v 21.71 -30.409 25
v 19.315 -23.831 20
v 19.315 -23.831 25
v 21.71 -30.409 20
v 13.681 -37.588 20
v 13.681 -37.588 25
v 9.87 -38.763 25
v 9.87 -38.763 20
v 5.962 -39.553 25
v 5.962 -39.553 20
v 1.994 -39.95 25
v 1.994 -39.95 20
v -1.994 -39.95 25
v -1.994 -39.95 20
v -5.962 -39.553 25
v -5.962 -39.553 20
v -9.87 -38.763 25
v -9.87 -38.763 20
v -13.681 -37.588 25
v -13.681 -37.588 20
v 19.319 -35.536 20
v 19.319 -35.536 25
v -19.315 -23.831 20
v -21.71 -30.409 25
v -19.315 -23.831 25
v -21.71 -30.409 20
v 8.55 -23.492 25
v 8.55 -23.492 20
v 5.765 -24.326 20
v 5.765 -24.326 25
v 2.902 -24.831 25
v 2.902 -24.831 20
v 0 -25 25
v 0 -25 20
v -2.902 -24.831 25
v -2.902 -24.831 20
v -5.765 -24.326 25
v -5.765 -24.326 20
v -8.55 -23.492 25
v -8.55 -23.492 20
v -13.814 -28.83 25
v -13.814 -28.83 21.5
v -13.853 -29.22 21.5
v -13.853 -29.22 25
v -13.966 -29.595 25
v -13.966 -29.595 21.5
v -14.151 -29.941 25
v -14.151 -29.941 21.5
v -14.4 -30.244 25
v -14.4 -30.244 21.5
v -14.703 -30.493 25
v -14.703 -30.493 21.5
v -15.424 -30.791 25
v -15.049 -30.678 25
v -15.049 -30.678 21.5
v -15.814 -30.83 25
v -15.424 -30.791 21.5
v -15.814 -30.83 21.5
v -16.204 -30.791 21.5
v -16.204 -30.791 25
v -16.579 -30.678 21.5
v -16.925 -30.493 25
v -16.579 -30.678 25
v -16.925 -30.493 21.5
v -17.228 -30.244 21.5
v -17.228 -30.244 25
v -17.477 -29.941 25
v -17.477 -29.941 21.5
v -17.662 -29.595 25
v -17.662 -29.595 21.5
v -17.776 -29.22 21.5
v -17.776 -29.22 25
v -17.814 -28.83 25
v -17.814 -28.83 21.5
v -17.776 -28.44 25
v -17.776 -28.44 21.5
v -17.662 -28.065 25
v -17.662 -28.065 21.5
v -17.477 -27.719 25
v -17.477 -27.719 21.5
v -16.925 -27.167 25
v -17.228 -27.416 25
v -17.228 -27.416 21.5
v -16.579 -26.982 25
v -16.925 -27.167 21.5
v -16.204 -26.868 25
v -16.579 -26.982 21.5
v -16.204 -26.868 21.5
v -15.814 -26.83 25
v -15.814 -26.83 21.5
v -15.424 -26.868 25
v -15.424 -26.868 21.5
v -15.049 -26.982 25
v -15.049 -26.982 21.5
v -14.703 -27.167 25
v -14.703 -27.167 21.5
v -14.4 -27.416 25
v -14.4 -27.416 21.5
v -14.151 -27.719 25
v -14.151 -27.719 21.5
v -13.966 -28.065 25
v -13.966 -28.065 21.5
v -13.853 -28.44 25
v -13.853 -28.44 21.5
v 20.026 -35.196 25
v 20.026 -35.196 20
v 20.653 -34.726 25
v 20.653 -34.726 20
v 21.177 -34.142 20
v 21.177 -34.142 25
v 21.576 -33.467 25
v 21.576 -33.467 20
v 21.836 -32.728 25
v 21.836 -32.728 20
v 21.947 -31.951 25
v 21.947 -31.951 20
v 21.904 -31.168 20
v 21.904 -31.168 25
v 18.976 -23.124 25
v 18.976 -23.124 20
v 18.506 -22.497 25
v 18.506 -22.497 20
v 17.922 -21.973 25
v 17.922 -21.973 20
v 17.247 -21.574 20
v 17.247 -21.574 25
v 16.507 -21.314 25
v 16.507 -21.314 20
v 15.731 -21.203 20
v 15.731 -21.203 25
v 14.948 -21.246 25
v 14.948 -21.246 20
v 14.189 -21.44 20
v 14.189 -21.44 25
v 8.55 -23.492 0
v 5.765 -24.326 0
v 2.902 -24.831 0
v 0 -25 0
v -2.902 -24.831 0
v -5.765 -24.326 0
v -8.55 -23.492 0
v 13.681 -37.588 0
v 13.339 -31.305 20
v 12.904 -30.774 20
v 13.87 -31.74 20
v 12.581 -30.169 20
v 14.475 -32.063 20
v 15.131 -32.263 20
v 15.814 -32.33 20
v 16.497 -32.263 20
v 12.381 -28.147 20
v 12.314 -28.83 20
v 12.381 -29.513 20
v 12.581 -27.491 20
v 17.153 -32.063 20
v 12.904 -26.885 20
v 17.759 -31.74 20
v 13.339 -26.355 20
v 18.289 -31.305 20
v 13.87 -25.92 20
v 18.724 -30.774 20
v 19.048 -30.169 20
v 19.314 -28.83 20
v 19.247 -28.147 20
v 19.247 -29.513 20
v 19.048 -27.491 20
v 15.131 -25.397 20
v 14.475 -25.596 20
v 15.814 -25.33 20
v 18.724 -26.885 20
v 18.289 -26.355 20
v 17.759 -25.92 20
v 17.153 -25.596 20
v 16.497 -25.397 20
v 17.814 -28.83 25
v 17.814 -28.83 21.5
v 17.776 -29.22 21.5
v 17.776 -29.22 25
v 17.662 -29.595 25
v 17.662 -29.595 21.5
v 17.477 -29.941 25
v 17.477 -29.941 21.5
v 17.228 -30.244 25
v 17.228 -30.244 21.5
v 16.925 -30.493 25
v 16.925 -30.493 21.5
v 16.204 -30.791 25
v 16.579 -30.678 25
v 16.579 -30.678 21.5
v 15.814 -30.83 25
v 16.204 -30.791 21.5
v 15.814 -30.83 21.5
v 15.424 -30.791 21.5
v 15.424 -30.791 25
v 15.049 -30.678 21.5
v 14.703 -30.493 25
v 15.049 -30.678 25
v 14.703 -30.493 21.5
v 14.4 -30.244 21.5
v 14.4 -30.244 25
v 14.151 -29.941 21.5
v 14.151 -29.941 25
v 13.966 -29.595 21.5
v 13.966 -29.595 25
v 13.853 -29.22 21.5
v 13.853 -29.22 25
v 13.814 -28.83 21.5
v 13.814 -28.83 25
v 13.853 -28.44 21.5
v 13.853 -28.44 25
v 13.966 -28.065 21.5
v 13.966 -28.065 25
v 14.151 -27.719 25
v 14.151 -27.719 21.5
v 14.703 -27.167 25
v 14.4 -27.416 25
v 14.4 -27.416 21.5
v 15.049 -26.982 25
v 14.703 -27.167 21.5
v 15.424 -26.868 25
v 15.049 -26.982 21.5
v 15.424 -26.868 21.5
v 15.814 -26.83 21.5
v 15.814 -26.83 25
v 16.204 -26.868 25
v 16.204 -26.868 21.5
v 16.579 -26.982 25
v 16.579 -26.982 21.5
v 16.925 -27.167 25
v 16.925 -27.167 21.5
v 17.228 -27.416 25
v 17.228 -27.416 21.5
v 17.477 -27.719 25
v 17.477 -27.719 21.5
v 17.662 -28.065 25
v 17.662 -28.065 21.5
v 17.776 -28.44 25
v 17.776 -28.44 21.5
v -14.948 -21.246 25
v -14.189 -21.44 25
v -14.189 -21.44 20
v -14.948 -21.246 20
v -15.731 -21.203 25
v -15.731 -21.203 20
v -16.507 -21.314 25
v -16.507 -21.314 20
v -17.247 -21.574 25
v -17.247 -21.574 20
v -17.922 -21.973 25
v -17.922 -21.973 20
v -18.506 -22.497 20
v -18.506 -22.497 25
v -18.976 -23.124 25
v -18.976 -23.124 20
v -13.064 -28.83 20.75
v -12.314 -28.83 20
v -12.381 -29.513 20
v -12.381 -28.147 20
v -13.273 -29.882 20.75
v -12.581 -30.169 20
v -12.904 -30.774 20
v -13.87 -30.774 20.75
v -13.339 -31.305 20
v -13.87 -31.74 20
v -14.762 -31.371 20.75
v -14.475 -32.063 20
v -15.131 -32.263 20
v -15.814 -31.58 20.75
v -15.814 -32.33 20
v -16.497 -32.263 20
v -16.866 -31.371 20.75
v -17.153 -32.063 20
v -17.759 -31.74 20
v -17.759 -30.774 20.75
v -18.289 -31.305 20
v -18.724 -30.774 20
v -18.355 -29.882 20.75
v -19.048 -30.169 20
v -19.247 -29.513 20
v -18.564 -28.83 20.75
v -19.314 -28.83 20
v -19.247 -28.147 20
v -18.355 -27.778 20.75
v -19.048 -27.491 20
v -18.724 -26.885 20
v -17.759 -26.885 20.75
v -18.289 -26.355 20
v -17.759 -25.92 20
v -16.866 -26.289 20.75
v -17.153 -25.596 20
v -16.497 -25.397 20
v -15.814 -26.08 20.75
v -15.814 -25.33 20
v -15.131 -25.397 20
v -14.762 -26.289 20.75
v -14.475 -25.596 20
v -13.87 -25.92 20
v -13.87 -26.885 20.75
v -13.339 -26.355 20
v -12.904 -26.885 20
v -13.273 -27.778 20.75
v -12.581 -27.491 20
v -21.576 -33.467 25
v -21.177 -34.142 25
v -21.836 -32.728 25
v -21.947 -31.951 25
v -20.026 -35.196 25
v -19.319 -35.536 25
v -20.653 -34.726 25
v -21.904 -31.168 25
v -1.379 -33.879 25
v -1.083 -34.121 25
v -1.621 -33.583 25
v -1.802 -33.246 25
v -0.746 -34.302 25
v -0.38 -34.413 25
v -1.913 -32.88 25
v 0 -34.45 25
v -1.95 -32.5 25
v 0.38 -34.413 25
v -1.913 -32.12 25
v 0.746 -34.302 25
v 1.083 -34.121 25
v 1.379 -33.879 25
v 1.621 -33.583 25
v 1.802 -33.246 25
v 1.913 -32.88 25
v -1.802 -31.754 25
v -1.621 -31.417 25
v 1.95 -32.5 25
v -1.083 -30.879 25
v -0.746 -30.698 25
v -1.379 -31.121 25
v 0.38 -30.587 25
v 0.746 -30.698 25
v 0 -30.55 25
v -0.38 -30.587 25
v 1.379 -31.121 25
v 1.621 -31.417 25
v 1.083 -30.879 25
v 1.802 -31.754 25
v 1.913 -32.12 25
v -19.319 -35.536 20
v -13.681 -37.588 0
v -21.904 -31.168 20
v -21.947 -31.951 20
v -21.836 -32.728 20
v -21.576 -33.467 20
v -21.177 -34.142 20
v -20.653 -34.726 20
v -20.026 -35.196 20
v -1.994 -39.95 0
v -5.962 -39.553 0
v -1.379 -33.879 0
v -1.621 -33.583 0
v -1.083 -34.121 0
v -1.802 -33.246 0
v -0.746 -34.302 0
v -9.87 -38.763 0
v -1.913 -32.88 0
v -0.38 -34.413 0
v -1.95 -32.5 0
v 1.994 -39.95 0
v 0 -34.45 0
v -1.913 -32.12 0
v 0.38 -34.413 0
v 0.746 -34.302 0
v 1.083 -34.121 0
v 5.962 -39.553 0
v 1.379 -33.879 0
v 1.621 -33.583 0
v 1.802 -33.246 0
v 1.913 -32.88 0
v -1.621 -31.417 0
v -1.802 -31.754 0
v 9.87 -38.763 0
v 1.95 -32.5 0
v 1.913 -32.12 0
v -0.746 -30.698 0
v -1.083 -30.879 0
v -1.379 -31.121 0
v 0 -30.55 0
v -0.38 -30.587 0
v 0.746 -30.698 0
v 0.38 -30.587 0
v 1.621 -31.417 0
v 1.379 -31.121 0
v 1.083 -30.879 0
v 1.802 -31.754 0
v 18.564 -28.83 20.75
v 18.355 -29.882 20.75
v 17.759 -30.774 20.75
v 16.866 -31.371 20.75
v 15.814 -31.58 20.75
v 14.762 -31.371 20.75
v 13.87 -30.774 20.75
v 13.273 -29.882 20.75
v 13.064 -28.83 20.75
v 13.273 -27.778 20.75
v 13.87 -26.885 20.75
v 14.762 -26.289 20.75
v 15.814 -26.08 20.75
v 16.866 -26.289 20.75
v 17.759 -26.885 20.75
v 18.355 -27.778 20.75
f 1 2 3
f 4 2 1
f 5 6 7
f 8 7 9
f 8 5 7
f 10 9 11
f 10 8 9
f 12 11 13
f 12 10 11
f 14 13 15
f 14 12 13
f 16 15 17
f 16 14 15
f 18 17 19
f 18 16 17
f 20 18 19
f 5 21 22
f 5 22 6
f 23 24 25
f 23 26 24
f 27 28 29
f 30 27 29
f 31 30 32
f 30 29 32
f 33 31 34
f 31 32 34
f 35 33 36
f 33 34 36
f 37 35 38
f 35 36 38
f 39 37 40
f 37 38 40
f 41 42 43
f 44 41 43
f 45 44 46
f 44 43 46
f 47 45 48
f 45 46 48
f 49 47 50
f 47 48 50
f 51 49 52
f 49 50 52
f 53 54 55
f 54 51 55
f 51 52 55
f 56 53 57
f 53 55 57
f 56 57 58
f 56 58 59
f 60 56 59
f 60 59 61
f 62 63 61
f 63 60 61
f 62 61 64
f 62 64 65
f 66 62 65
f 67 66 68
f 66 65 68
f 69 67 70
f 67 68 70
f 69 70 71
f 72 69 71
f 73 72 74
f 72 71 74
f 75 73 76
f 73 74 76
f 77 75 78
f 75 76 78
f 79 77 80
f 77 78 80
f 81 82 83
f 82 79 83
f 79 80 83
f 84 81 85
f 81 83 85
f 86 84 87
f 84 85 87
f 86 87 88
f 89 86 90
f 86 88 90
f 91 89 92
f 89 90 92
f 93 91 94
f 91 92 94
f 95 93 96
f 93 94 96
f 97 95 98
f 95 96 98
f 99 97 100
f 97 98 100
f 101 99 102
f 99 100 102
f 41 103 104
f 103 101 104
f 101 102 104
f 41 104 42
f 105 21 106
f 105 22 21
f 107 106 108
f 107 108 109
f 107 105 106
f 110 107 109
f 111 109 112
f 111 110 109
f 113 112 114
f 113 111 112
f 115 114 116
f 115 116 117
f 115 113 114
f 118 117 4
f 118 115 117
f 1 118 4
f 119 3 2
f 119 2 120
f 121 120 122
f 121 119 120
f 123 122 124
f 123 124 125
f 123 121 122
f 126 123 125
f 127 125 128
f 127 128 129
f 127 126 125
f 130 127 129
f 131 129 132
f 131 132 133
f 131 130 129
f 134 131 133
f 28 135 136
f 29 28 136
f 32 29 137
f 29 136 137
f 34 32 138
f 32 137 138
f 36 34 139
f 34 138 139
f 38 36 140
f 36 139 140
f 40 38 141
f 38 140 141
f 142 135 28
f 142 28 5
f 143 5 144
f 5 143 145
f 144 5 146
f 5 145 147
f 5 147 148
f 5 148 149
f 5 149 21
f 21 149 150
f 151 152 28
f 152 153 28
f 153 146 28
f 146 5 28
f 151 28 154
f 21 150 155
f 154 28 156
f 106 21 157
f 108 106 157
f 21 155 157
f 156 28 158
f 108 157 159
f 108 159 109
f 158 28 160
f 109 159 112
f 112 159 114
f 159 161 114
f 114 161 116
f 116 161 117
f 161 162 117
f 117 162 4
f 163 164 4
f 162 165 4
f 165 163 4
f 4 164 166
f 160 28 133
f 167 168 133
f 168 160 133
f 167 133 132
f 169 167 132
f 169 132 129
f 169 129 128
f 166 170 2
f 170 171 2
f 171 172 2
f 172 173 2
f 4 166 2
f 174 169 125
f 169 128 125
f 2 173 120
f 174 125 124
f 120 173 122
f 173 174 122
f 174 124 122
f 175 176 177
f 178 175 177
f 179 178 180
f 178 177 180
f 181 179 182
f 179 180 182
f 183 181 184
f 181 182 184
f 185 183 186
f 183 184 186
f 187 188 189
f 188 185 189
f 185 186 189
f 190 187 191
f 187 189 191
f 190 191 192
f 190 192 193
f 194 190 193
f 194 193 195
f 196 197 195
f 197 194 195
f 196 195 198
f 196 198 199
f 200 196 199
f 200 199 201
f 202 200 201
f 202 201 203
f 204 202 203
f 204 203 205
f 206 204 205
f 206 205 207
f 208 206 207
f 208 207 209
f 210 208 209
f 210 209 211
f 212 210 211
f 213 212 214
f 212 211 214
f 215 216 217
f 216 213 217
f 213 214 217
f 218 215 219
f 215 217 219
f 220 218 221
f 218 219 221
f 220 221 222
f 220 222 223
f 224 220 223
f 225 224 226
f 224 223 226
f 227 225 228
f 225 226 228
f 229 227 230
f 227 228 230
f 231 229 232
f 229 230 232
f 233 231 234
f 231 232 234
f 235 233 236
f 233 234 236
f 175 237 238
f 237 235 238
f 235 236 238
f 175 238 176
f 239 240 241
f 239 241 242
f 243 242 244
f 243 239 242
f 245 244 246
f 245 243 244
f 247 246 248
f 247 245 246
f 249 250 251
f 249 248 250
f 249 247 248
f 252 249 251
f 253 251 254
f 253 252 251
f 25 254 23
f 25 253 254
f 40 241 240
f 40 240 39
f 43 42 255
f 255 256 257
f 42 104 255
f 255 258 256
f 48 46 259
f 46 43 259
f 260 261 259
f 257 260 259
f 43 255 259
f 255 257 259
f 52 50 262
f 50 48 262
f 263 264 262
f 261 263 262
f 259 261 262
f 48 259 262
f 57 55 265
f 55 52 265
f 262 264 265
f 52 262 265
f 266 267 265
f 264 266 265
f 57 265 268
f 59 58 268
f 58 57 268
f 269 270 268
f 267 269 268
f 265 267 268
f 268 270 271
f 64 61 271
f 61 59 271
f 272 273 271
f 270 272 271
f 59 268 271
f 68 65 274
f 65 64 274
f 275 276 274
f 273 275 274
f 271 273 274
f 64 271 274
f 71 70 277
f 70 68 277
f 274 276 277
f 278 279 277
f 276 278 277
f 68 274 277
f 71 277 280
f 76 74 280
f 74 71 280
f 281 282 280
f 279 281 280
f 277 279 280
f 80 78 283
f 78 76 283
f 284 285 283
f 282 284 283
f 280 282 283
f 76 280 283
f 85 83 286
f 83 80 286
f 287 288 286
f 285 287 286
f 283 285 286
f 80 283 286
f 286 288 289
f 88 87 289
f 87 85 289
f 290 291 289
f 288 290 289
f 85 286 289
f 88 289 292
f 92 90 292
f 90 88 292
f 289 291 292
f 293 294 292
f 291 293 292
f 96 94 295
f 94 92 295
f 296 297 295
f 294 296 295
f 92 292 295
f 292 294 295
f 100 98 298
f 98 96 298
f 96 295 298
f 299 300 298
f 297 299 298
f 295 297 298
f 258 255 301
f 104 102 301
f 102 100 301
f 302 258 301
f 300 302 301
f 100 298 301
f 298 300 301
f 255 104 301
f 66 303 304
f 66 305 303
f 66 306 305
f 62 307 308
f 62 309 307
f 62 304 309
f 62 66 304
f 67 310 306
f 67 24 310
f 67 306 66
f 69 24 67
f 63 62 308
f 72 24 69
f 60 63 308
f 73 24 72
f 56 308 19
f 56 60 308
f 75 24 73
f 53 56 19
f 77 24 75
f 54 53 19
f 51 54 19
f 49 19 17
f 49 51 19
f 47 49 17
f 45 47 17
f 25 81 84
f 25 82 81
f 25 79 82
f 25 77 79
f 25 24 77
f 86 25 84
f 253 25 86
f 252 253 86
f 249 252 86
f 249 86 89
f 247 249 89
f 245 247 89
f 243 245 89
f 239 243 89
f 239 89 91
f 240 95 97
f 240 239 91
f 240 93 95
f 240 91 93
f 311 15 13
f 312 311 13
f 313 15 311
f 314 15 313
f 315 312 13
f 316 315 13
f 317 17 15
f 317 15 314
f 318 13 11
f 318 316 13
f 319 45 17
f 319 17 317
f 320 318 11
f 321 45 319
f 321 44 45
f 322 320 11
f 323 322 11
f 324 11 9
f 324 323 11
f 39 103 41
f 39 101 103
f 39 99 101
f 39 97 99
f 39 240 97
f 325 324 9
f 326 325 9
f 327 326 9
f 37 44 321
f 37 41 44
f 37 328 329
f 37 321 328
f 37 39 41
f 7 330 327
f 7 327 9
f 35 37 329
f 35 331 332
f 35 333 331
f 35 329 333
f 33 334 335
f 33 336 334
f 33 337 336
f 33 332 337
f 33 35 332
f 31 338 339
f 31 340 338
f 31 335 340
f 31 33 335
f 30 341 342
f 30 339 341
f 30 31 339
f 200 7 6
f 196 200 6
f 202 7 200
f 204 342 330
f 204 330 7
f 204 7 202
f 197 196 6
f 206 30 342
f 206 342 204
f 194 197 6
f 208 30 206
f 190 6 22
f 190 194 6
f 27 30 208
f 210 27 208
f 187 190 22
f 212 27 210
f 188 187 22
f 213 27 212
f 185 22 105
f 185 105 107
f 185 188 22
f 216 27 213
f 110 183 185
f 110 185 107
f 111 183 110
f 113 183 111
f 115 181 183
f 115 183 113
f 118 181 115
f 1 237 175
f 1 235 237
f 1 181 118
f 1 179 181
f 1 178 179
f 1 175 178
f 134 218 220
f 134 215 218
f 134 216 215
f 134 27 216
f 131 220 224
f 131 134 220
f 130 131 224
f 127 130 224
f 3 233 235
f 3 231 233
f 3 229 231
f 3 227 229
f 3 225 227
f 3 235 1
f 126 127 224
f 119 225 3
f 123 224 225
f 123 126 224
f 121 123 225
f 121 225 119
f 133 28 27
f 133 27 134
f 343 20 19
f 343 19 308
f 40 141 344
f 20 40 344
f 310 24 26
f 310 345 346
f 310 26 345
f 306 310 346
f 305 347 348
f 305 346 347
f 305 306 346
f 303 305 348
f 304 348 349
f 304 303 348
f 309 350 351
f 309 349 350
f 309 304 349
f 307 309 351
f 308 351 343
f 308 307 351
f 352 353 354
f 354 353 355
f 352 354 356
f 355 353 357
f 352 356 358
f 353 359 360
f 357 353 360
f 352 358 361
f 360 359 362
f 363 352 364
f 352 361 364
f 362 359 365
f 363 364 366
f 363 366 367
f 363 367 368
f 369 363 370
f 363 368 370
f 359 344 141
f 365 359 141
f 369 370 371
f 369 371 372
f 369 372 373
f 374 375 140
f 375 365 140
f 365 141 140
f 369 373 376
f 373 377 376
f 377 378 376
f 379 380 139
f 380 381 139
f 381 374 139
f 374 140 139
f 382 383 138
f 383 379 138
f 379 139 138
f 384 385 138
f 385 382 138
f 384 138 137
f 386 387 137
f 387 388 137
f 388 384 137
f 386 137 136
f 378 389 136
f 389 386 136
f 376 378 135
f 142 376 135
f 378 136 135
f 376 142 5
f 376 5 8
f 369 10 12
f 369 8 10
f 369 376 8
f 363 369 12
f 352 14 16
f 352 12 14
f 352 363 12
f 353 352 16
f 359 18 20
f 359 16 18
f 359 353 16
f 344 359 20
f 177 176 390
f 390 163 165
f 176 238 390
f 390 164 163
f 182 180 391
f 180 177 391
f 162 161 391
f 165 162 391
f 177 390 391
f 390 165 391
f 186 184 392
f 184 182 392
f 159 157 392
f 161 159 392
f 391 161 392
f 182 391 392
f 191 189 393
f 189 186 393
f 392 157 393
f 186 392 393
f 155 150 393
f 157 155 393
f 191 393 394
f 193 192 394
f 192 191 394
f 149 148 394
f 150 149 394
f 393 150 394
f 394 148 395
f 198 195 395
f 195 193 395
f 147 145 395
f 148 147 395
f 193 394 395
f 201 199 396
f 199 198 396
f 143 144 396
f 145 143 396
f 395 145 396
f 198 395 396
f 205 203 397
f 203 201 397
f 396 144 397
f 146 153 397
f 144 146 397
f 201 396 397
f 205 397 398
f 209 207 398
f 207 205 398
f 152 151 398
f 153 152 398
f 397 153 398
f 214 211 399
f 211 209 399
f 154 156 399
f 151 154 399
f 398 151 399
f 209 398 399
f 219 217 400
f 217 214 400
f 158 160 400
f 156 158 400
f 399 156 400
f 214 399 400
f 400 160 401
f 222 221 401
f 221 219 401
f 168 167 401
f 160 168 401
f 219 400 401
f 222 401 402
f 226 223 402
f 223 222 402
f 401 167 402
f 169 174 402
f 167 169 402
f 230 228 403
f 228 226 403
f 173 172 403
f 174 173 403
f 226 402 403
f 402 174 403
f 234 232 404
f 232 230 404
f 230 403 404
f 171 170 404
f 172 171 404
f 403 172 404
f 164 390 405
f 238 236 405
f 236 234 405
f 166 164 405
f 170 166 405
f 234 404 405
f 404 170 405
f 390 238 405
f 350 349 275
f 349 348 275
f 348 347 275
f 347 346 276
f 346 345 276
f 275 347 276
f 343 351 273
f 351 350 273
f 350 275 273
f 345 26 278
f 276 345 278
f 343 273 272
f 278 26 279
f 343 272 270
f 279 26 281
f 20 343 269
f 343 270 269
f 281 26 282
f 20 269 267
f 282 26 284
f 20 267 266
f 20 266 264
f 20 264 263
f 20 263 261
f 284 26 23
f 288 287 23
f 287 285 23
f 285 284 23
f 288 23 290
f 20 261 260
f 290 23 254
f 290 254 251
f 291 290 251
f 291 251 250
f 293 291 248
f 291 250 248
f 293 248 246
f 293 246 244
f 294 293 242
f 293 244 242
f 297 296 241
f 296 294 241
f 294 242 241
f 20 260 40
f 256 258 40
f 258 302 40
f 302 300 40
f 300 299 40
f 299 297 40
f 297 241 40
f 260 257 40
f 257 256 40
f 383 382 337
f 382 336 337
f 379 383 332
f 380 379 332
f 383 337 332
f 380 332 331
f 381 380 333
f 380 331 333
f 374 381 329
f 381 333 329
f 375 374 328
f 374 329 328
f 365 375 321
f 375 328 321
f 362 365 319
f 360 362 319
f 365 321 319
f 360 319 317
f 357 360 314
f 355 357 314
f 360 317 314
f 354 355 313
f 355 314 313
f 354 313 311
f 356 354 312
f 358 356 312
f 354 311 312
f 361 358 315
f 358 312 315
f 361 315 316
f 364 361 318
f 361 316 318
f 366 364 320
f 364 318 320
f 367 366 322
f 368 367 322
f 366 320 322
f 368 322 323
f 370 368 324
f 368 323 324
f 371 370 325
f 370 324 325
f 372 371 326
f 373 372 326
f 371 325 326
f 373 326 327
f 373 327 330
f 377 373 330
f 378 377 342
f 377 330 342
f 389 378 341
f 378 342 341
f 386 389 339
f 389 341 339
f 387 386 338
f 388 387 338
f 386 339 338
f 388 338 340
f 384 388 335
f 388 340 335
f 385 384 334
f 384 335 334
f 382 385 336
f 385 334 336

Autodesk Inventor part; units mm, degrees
ref_plane "YZ Plane" through (0, 0, 0) normal (1, 0, 0) x (0, 1, 0)
ref_plane "XZ Plane" through (0, 0, 0) normal (0, 1, 0) x (-1, 0, 0)
ref_plane "XY Plane" through (0, 0, 0) normal (0, 0, 1) x (1, 0, 0)
sketch "Sketch1" plane through (0, 0, 0) normal (0, 0, 1) x (1, 0, 0)
  circle A0 centre (0, 0) radius 40
  circle A1 centre (0, 0) radius 32.5
  circle A2 centre (0, 0) radius 25
  line L0 (-8.5505, -23.4923) -> (-13.6808, -37.5877)
  line L1 (0, 0) -> (57.2098, 0) construction
  line L2 (8.5505, -23.4923) -> (13.6808, -37.5877)
  line L3 (0, 0) -> (61.497, 0) construction
  point P0 (0, -32.5)
  dimension "d1" = 65
  dimension "d0" = 80
  dimension "d2" = 50
  dimension "d4" = 110
  dimension "d6" = 70
extrude "Extrusion1" add sketch "Sketch1" along normal blind 20 contours L0 A1 L2 A0 | L0 A2 L2 A1 picked at (0, -34.8535) picked at (-0.9674, -29.7972)
sketch "Sketch2" plane through (0, 0, 20) normal (0, 0, 1) x (1, 0, 0)
  arc A0 (-13.6808, -37.5877) -> (13.6808, -37.5877) centre (0, 0) ccw projected
  line L0 (13.6808, -37.5877) -> (8.5505, -23.4923) projected
  arc A1 (-8.5505, -23.4923) -> (8.5505, -23.4923) centre (0, 0) ccw projected
  line L1 (-8.5505, -23.4923) -> (-13.6808, -37.5877) projected
  line L2 (8.5505, -23.4923) -> (17.9474, -20.0721)
  line L3 (17.9474, -20.0721) -> (23.0777, -34.1675)
  line L4 (23.0777, -34.1675) -> (13.6808, -37.5877)
  line L5 (-13.6808, -37.5877) -> (-23.0777, -34.1675)
  line L6 (-23.0777, -34.1675) -> (-17.9474, -20.0721)
  line L7 (-8.5505, -23.4923) -> (-13.6808, -37.5877) projected
  line L8 (-17.9474, -20.0721) -> (-8.5505, -23.4923)
  circle A2 centre (15.8141, -28.8299) radius 2
  circle A3 centre (-15.8141, -28.8299) radius 2
  dimension "d9" = 10
  dimension "d10" = 10
  dimension "d11" = 4
  dimension "d12" = 4
  dimension "d13" = 7.5
  dimension "d14" = 7.5
  dimension "d15" = 5
  dimension "d16" = 5
extrude "Extrusion2" add sketch "Sketch2" along normal blind 5
chamfer "Chamfer1" distance 1.5 angle 45 2 edges at (-17.8141, -28.8299, 20) (13.8141, -28.8299, 20)
fillet "Fillet1" radius 4 4 edges at (17.9474, -20.0721, 22.5) (-17.9474, -20.0721, 22.5) (-23.0777, -34.1675, 22.5) (23.0777, -34.1675, 22.5)
hole "Hole1" at (0, -32.5, 0) direction (0, 0, 1) diameter 3.9 end through all
equation "\"d10\" = d9"
properties part number "3DP_ABS_Bowl_Feeder_Standoff" material "ABS Plastic"
